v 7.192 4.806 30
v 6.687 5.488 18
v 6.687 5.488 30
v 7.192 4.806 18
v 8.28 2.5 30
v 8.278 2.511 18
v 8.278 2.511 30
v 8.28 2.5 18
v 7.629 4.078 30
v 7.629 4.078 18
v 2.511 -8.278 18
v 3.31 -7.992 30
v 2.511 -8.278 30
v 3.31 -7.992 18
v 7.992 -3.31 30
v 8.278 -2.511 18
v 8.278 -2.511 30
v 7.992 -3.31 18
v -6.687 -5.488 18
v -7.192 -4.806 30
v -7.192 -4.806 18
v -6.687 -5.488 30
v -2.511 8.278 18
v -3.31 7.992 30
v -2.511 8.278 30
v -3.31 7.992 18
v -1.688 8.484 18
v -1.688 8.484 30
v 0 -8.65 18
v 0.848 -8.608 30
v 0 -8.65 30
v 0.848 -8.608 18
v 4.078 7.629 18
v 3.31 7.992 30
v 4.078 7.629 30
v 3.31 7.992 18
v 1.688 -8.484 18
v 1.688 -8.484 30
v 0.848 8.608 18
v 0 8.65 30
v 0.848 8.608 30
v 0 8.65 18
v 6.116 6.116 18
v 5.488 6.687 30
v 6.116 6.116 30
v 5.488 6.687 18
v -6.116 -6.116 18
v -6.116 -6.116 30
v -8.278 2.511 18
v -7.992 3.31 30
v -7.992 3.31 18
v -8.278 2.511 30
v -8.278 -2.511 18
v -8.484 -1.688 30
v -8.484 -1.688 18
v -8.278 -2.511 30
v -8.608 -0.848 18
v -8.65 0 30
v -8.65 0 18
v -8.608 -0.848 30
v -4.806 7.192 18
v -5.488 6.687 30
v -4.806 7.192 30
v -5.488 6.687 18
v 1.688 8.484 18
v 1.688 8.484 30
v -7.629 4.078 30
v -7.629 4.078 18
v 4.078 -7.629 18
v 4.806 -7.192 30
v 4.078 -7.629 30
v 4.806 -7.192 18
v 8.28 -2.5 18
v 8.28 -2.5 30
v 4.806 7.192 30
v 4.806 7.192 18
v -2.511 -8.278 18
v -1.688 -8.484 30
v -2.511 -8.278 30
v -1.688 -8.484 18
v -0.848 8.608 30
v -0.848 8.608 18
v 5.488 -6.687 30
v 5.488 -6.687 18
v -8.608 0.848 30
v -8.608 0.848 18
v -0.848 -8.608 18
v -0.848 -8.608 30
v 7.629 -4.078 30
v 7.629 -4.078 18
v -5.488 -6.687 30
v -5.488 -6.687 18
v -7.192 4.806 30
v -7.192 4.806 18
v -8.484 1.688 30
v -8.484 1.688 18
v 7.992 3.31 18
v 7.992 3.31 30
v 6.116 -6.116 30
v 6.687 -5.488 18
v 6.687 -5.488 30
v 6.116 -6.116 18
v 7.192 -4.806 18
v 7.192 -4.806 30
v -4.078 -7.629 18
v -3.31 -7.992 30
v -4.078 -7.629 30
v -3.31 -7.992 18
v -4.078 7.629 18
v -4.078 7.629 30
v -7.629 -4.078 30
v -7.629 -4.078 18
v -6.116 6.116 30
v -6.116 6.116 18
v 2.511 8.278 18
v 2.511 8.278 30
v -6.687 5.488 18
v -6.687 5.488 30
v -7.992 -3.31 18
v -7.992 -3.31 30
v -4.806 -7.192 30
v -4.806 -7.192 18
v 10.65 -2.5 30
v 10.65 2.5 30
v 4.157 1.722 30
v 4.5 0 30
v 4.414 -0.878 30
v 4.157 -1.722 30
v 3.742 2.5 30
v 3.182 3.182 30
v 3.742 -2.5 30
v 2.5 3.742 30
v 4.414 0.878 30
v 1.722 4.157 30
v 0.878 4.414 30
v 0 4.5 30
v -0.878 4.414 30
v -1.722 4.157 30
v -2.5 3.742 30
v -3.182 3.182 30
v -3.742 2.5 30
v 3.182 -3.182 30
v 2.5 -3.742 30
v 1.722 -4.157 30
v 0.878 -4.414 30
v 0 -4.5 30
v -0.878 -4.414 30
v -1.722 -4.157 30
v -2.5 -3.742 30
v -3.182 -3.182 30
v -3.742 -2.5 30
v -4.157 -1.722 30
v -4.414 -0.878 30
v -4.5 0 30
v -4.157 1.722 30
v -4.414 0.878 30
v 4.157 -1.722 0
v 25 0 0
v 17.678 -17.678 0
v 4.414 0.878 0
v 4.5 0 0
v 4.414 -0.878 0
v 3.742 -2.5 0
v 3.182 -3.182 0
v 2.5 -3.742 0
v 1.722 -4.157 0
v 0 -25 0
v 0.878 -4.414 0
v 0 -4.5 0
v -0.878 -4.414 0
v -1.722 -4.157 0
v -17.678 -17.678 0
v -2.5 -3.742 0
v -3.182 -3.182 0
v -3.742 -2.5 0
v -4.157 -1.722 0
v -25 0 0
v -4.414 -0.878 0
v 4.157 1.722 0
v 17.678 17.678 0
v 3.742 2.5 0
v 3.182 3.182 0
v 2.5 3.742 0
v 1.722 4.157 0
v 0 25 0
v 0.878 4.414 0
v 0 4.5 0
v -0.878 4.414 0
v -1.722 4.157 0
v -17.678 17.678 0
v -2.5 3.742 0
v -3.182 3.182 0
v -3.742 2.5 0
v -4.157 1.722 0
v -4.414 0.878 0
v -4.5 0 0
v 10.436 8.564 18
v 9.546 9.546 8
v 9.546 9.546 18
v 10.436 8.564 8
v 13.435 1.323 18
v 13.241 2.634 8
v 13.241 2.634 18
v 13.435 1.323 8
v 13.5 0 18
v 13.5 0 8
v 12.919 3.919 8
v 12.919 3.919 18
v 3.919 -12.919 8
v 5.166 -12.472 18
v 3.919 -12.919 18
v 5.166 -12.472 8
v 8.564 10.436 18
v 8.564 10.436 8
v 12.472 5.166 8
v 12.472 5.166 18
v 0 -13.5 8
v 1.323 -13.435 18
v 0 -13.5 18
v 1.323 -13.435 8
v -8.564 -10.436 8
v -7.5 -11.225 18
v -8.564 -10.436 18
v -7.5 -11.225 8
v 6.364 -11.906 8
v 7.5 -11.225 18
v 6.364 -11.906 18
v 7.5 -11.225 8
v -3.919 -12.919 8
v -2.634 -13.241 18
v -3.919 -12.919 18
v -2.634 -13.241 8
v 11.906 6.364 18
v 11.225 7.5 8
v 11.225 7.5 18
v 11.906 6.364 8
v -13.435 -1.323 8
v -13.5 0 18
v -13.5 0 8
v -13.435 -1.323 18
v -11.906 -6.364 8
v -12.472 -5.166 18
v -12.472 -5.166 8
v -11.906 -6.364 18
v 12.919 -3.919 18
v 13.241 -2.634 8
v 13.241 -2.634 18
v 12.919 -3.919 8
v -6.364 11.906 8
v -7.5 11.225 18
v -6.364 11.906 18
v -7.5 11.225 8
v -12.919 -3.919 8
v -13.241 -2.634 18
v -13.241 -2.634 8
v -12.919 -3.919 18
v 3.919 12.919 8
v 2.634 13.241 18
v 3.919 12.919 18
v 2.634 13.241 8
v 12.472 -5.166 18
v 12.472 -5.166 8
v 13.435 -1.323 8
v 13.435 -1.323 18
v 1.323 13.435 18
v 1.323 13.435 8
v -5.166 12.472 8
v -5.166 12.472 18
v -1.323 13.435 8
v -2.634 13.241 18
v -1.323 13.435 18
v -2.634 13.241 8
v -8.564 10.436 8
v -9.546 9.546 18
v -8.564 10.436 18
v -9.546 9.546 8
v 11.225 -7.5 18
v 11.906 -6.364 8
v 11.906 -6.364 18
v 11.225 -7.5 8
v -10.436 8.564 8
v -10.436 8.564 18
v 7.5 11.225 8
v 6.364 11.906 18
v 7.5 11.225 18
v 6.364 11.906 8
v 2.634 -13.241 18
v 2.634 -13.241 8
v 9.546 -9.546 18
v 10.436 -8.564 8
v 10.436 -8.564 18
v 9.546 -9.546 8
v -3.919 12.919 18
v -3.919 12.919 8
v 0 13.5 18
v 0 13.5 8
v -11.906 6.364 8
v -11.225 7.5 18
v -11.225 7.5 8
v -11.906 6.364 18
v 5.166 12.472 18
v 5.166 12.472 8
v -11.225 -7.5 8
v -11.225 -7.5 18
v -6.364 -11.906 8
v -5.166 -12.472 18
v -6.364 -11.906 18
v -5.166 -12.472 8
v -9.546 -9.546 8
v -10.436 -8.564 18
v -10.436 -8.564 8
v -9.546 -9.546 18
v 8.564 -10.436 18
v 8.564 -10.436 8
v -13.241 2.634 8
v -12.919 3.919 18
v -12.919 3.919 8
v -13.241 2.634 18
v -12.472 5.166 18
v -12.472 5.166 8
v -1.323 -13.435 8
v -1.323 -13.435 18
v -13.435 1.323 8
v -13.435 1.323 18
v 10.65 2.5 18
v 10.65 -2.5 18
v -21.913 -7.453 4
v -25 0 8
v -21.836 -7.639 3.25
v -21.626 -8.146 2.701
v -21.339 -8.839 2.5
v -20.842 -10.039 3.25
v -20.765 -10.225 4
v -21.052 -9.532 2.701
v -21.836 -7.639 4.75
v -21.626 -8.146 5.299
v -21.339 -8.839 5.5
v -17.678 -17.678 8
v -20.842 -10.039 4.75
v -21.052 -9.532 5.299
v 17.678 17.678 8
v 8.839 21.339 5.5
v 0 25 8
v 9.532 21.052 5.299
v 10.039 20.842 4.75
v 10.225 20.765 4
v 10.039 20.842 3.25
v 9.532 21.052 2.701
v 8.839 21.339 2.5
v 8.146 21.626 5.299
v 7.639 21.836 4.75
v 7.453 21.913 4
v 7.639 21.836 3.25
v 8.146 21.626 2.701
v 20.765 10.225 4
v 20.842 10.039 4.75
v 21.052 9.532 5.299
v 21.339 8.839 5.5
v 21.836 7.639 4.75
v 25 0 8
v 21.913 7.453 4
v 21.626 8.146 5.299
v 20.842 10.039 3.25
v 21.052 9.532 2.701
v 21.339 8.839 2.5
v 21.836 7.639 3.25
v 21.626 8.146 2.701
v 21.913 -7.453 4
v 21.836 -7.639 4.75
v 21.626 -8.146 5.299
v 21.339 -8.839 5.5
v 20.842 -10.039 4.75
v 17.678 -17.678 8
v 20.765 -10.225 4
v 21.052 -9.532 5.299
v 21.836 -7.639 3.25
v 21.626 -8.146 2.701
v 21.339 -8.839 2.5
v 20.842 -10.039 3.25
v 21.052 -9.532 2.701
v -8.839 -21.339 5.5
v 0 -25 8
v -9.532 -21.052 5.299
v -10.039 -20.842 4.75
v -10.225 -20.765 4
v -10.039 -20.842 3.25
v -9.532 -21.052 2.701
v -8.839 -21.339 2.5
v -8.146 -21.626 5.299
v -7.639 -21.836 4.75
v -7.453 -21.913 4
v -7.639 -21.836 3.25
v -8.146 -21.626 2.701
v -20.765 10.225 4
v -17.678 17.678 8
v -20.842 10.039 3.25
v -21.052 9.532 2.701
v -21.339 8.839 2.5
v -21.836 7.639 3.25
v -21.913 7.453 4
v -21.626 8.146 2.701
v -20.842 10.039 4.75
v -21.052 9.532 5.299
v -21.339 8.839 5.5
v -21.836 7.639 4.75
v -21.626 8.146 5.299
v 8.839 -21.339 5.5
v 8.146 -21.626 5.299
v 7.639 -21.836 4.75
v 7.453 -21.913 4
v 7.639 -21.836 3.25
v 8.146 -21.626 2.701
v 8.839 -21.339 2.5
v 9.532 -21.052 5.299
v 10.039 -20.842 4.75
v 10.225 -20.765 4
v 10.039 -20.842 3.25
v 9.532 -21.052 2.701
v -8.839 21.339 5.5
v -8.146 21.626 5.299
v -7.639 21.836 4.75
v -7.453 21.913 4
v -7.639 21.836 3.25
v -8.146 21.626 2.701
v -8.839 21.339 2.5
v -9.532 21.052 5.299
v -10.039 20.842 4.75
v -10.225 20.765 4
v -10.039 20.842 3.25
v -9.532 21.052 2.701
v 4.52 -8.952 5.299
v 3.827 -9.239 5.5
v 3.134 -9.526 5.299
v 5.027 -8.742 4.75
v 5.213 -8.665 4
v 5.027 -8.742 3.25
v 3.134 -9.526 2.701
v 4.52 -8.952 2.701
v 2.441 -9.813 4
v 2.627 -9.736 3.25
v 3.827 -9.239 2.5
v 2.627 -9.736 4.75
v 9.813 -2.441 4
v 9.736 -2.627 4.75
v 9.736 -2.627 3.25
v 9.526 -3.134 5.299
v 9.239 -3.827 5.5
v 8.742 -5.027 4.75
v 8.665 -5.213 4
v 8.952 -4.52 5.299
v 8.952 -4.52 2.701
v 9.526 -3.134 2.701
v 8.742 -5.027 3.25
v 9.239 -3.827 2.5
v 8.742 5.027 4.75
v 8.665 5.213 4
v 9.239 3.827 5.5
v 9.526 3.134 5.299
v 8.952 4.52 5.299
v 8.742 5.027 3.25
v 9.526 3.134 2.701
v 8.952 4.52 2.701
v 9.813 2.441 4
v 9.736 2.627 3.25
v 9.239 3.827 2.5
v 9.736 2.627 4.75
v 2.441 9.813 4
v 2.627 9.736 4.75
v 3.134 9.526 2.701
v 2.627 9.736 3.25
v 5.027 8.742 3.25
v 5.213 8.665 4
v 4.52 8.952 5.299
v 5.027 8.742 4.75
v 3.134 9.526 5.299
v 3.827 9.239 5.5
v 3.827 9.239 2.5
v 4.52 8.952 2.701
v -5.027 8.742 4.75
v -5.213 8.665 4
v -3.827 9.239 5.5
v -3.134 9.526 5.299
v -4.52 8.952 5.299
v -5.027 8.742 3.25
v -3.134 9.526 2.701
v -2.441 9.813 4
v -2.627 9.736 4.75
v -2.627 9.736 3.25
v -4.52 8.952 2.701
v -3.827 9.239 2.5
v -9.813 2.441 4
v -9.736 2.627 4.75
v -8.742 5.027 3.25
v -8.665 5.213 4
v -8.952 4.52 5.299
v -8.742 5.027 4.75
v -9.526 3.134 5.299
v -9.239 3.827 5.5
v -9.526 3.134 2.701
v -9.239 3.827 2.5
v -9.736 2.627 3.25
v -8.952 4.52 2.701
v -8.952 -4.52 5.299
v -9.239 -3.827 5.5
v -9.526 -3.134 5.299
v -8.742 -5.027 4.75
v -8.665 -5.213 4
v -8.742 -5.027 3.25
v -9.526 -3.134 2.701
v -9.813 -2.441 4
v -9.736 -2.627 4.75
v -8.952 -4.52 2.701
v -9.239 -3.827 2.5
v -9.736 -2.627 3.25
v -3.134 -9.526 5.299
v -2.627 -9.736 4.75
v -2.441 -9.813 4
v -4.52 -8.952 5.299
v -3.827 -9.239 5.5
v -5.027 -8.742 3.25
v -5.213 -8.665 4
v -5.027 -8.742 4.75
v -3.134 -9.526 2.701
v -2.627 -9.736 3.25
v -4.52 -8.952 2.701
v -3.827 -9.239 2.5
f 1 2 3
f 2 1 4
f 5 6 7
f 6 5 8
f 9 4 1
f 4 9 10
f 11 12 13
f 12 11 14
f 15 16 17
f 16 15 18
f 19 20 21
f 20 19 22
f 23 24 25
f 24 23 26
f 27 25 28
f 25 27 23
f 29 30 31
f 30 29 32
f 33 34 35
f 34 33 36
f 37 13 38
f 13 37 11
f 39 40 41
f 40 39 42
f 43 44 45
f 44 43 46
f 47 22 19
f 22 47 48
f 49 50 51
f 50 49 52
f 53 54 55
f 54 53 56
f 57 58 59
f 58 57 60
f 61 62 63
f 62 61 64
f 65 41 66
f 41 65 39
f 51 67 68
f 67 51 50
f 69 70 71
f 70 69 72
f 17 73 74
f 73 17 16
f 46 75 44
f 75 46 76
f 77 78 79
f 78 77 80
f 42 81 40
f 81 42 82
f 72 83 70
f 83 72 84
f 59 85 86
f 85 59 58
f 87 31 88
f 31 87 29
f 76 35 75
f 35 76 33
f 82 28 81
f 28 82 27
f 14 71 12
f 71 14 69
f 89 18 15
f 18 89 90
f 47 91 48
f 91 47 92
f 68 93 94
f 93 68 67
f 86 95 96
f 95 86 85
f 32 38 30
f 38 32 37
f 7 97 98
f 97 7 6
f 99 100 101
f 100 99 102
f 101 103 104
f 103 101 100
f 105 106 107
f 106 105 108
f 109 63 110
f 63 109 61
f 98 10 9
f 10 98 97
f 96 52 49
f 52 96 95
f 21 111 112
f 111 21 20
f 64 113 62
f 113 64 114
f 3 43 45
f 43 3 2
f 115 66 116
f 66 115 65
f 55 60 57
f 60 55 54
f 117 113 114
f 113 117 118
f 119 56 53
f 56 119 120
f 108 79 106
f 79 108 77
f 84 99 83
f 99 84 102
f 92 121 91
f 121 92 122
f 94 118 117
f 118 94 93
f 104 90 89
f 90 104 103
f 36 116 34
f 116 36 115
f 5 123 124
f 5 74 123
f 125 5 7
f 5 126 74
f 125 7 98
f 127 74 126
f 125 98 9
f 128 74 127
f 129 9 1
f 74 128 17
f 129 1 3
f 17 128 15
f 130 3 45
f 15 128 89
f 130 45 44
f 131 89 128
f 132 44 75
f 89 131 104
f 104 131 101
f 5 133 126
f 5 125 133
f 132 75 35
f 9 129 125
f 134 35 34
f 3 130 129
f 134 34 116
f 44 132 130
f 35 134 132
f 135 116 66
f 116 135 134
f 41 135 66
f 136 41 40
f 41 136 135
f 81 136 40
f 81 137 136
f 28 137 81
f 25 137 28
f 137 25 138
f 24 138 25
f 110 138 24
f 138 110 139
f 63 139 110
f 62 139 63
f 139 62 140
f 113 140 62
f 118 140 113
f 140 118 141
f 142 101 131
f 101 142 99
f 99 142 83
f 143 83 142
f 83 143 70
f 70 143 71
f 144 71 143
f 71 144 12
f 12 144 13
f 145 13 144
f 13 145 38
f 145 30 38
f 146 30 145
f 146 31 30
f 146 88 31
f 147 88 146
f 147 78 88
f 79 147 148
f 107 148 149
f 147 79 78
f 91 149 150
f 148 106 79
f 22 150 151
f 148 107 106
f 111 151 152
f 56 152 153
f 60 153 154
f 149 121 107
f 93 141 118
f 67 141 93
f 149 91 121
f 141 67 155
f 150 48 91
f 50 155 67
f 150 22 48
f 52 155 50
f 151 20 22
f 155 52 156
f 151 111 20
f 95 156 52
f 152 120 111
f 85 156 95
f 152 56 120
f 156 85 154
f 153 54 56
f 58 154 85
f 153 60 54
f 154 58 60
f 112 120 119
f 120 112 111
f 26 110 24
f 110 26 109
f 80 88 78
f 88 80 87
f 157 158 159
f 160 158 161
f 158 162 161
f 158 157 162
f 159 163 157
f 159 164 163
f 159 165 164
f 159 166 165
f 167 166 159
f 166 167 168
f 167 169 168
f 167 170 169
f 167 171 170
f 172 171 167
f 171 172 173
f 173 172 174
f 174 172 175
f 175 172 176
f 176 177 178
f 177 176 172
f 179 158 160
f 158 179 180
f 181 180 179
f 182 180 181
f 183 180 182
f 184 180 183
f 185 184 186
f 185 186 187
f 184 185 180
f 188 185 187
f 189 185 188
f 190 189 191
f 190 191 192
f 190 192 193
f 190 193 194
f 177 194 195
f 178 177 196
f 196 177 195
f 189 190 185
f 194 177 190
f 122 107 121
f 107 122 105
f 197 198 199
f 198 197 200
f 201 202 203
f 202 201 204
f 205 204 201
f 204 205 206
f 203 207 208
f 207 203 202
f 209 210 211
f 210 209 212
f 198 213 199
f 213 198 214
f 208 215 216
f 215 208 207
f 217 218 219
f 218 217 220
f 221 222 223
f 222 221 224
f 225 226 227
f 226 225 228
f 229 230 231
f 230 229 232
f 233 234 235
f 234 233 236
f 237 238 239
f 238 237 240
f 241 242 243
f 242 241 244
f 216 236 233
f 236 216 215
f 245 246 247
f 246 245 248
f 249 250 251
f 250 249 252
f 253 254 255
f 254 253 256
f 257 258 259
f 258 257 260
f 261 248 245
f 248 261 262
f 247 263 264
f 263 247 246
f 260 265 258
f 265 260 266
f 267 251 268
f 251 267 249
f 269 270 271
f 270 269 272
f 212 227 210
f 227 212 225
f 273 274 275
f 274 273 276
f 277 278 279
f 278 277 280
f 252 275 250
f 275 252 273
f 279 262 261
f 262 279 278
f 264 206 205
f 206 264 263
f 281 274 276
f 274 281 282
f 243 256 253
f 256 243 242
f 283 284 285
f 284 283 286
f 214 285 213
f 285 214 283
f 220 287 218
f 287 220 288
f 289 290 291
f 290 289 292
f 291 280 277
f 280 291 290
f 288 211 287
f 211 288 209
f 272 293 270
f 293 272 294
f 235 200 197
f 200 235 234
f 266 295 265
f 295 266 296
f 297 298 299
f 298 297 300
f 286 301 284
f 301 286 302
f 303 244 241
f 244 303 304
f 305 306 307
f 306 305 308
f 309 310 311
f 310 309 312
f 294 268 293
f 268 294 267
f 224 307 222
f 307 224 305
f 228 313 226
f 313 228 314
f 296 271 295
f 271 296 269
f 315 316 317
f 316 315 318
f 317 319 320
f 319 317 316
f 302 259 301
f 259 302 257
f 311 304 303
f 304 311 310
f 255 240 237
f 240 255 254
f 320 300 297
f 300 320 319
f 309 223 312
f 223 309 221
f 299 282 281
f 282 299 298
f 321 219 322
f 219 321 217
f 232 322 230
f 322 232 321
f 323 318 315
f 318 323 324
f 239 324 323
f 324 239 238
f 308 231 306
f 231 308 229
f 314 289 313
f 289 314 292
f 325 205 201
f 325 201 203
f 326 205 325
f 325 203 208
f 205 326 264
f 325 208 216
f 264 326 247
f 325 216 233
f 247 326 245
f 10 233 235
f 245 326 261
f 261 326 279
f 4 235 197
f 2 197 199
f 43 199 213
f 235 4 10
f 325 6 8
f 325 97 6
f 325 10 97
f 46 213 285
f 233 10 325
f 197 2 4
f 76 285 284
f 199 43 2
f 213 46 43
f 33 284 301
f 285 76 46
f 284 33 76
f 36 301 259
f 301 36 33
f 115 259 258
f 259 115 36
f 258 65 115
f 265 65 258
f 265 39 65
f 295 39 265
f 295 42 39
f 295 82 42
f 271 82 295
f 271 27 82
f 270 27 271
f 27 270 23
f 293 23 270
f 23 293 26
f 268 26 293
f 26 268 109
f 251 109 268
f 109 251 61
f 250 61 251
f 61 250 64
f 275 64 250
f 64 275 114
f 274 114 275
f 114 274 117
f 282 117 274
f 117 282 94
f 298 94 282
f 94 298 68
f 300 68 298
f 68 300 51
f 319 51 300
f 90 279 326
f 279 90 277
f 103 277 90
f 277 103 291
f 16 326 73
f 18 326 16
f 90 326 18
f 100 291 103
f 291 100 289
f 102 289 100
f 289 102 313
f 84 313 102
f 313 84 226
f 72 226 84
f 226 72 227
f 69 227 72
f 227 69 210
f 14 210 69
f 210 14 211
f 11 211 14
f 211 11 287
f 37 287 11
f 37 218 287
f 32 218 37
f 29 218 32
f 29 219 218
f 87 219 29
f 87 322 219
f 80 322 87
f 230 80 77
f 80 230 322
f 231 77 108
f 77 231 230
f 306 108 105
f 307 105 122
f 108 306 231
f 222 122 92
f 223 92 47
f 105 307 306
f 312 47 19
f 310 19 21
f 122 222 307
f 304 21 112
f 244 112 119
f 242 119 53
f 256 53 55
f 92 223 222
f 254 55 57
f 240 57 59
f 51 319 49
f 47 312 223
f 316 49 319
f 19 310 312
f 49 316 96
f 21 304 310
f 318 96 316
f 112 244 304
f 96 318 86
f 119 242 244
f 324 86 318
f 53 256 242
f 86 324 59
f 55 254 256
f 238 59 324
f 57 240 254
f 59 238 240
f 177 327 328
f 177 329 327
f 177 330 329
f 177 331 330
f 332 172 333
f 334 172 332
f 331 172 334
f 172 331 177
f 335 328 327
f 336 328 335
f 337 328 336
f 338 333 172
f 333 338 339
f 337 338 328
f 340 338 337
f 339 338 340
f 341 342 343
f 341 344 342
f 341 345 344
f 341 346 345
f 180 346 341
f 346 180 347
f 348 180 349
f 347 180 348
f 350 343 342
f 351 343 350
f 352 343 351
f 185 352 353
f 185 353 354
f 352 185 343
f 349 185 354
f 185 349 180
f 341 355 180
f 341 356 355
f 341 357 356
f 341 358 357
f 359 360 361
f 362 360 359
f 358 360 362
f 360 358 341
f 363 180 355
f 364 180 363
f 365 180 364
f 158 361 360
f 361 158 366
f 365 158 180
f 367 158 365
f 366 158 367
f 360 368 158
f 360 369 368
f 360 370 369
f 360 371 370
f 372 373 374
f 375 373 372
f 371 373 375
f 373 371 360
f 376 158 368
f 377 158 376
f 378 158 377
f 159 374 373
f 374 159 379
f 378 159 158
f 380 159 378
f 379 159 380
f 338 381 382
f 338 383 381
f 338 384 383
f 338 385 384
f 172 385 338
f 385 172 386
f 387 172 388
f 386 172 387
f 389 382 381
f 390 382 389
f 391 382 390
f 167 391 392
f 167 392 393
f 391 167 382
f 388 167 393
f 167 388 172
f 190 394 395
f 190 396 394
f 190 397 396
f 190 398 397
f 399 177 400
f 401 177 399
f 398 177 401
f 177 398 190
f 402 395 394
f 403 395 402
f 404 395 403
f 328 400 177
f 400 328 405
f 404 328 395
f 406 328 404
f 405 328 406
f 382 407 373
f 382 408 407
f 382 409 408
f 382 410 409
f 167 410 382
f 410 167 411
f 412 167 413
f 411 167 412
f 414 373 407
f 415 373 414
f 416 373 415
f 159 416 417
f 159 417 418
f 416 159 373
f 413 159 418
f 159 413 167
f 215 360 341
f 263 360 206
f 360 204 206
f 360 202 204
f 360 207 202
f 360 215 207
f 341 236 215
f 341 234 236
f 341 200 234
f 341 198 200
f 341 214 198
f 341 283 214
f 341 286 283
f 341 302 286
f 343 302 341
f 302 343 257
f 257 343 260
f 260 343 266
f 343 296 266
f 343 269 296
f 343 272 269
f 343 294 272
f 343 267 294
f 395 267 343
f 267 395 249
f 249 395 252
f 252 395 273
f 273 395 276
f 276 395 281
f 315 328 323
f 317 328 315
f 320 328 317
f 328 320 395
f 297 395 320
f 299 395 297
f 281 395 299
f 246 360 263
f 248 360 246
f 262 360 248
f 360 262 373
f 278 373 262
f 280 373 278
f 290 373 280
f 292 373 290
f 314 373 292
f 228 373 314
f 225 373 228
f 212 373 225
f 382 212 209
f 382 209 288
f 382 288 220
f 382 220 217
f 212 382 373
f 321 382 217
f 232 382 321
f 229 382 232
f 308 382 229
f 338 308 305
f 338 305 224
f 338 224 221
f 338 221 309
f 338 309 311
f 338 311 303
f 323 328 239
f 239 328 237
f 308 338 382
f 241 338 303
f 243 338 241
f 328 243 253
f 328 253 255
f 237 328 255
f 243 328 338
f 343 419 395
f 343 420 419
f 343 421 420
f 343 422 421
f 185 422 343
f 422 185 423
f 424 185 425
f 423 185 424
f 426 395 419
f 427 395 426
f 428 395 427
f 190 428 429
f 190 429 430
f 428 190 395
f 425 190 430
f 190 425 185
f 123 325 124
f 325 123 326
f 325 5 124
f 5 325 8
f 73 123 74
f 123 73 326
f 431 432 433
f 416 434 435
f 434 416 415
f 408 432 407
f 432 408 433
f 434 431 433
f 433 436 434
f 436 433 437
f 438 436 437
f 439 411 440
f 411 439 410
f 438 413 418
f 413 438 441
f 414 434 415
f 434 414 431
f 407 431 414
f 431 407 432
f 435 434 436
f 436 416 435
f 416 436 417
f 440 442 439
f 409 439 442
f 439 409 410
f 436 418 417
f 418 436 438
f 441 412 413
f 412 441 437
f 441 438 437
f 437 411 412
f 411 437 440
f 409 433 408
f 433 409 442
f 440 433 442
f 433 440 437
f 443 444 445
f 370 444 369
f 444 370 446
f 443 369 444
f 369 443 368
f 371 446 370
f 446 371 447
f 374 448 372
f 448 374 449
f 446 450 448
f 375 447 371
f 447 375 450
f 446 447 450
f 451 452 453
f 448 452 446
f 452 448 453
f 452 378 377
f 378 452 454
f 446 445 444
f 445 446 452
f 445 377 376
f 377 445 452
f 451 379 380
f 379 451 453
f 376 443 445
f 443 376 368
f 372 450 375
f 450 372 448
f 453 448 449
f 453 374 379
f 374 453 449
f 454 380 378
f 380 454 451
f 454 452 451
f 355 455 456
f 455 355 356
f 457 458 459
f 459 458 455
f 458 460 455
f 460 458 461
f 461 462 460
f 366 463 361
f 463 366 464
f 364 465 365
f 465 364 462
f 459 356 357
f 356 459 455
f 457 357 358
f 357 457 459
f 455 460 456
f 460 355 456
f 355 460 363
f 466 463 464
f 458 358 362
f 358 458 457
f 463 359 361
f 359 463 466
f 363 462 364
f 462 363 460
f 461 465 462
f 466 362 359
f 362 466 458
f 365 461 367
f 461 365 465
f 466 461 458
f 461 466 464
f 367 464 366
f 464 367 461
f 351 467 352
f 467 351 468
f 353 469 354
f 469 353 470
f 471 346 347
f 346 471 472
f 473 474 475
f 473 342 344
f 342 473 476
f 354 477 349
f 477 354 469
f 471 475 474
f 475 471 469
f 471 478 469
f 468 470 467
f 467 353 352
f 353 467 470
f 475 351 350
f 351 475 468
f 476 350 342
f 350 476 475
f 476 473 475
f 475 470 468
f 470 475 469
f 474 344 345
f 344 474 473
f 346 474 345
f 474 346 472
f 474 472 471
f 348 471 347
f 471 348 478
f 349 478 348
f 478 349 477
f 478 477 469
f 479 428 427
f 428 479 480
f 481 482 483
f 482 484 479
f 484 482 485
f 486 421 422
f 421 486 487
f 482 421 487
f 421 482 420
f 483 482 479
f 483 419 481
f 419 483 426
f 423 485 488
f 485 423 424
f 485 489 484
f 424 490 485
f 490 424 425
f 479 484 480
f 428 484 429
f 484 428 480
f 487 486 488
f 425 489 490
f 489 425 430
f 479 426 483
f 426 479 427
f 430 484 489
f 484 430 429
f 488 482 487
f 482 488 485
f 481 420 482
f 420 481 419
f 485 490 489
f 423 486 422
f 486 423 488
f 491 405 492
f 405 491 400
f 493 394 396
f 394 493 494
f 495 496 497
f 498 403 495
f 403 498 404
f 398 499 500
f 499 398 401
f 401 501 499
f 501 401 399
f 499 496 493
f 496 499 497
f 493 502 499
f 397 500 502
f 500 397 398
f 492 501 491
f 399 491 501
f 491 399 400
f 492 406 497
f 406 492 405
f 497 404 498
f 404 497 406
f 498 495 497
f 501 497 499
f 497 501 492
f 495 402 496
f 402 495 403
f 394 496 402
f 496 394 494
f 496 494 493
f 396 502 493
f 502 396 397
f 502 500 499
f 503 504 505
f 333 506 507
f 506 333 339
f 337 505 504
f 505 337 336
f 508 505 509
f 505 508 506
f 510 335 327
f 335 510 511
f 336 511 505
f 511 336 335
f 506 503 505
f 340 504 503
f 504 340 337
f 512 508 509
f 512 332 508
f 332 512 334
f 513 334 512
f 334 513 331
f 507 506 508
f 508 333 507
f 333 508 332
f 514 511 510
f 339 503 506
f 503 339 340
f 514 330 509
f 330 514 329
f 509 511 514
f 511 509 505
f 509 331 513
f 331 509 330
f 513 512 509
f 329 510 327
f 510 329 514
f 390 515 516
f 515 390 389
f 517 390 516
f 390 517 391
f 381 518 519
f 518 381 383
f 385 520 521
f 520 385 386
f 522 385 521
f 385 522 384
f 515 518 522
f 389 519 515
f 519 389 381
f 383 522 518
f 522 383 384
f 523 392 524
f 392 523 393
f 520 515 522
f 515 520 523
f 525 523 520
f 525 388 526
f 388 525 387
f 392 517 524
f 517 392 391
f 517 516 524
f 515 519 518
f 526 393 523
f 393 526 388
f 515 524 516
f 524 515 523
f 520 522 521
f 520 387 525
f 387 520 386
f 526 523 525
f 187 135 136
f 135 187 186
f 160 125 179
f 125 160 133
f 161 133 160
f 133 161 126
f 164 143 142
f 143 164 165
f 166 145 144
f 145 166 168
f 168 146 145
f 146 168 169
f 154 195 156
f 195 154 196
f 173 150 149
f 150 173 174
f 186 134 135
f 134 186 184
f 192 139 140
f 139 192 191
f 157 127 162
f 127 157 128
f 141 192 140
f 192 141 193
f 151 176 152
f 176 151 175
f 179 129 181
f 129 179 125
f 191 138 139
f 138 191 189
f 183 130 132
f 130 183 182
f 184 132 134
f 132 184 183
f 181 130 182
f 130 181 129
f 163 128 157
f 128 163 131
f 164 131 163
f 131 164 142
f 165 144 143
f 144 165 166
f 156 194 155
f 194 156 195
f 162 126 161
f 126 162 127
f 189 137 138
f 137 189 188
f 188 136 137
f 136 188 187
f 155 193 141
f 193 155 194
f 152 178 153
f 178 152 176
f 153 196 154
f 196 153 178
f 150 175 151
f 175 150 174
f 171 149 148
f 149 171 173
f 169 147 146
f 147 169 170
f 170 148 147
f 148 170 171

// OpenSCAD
// inlet into reductor hole
// with anti-slip notch

od = 17.3;

od2 = 27; // spacer touch reductor hole
h2  = 10; // height spacer

od3 = 50; // counter ring with screw holes for counting
h3  =  8; // ring height

notch_thick = 2;
notch_width = 5;

id = 9;
h  = 30; // total height
// cylindrical spacer to choose
// correct angle of the bearings

screws_n = 8; // number of screw holes
screws_d = 3; // screw hole

screws_h = 15; // screw hole depth

module notch()
{
  translate([od/2,0,h/2])
    cube([notch_thick*2, notch_width,h],center=true);
}

module bulk()
{
  cylinder(d=od,  h=h,     $fn=64);
  cylinder(d=od2, h=h2+h3, $fn=64);
  cylinder(d=od3, h=h3,    $fn=screws_n);
  notch();
}

module m8hole()
{
  translate([0,0,-0.001])
    cylinder(d=id, h=h+1, $fn=32);
}

module screwholes()
{
  for(i = [0:screws_n-1])
    rotate([0,0,360/screws_n*(i+0.5)])
      translate([0,0,h3/2])
        rotate([90,0,0])
          translate([0,0,od3/2-screws_h])
          cylinder(d=screws_d,h=od3,$fn=12);
}

// drills holes in the bulk
module inlet()
{
   difference()
   {
     bulk();
     m8hole();
     screwholes();
   }
}

inlet();
